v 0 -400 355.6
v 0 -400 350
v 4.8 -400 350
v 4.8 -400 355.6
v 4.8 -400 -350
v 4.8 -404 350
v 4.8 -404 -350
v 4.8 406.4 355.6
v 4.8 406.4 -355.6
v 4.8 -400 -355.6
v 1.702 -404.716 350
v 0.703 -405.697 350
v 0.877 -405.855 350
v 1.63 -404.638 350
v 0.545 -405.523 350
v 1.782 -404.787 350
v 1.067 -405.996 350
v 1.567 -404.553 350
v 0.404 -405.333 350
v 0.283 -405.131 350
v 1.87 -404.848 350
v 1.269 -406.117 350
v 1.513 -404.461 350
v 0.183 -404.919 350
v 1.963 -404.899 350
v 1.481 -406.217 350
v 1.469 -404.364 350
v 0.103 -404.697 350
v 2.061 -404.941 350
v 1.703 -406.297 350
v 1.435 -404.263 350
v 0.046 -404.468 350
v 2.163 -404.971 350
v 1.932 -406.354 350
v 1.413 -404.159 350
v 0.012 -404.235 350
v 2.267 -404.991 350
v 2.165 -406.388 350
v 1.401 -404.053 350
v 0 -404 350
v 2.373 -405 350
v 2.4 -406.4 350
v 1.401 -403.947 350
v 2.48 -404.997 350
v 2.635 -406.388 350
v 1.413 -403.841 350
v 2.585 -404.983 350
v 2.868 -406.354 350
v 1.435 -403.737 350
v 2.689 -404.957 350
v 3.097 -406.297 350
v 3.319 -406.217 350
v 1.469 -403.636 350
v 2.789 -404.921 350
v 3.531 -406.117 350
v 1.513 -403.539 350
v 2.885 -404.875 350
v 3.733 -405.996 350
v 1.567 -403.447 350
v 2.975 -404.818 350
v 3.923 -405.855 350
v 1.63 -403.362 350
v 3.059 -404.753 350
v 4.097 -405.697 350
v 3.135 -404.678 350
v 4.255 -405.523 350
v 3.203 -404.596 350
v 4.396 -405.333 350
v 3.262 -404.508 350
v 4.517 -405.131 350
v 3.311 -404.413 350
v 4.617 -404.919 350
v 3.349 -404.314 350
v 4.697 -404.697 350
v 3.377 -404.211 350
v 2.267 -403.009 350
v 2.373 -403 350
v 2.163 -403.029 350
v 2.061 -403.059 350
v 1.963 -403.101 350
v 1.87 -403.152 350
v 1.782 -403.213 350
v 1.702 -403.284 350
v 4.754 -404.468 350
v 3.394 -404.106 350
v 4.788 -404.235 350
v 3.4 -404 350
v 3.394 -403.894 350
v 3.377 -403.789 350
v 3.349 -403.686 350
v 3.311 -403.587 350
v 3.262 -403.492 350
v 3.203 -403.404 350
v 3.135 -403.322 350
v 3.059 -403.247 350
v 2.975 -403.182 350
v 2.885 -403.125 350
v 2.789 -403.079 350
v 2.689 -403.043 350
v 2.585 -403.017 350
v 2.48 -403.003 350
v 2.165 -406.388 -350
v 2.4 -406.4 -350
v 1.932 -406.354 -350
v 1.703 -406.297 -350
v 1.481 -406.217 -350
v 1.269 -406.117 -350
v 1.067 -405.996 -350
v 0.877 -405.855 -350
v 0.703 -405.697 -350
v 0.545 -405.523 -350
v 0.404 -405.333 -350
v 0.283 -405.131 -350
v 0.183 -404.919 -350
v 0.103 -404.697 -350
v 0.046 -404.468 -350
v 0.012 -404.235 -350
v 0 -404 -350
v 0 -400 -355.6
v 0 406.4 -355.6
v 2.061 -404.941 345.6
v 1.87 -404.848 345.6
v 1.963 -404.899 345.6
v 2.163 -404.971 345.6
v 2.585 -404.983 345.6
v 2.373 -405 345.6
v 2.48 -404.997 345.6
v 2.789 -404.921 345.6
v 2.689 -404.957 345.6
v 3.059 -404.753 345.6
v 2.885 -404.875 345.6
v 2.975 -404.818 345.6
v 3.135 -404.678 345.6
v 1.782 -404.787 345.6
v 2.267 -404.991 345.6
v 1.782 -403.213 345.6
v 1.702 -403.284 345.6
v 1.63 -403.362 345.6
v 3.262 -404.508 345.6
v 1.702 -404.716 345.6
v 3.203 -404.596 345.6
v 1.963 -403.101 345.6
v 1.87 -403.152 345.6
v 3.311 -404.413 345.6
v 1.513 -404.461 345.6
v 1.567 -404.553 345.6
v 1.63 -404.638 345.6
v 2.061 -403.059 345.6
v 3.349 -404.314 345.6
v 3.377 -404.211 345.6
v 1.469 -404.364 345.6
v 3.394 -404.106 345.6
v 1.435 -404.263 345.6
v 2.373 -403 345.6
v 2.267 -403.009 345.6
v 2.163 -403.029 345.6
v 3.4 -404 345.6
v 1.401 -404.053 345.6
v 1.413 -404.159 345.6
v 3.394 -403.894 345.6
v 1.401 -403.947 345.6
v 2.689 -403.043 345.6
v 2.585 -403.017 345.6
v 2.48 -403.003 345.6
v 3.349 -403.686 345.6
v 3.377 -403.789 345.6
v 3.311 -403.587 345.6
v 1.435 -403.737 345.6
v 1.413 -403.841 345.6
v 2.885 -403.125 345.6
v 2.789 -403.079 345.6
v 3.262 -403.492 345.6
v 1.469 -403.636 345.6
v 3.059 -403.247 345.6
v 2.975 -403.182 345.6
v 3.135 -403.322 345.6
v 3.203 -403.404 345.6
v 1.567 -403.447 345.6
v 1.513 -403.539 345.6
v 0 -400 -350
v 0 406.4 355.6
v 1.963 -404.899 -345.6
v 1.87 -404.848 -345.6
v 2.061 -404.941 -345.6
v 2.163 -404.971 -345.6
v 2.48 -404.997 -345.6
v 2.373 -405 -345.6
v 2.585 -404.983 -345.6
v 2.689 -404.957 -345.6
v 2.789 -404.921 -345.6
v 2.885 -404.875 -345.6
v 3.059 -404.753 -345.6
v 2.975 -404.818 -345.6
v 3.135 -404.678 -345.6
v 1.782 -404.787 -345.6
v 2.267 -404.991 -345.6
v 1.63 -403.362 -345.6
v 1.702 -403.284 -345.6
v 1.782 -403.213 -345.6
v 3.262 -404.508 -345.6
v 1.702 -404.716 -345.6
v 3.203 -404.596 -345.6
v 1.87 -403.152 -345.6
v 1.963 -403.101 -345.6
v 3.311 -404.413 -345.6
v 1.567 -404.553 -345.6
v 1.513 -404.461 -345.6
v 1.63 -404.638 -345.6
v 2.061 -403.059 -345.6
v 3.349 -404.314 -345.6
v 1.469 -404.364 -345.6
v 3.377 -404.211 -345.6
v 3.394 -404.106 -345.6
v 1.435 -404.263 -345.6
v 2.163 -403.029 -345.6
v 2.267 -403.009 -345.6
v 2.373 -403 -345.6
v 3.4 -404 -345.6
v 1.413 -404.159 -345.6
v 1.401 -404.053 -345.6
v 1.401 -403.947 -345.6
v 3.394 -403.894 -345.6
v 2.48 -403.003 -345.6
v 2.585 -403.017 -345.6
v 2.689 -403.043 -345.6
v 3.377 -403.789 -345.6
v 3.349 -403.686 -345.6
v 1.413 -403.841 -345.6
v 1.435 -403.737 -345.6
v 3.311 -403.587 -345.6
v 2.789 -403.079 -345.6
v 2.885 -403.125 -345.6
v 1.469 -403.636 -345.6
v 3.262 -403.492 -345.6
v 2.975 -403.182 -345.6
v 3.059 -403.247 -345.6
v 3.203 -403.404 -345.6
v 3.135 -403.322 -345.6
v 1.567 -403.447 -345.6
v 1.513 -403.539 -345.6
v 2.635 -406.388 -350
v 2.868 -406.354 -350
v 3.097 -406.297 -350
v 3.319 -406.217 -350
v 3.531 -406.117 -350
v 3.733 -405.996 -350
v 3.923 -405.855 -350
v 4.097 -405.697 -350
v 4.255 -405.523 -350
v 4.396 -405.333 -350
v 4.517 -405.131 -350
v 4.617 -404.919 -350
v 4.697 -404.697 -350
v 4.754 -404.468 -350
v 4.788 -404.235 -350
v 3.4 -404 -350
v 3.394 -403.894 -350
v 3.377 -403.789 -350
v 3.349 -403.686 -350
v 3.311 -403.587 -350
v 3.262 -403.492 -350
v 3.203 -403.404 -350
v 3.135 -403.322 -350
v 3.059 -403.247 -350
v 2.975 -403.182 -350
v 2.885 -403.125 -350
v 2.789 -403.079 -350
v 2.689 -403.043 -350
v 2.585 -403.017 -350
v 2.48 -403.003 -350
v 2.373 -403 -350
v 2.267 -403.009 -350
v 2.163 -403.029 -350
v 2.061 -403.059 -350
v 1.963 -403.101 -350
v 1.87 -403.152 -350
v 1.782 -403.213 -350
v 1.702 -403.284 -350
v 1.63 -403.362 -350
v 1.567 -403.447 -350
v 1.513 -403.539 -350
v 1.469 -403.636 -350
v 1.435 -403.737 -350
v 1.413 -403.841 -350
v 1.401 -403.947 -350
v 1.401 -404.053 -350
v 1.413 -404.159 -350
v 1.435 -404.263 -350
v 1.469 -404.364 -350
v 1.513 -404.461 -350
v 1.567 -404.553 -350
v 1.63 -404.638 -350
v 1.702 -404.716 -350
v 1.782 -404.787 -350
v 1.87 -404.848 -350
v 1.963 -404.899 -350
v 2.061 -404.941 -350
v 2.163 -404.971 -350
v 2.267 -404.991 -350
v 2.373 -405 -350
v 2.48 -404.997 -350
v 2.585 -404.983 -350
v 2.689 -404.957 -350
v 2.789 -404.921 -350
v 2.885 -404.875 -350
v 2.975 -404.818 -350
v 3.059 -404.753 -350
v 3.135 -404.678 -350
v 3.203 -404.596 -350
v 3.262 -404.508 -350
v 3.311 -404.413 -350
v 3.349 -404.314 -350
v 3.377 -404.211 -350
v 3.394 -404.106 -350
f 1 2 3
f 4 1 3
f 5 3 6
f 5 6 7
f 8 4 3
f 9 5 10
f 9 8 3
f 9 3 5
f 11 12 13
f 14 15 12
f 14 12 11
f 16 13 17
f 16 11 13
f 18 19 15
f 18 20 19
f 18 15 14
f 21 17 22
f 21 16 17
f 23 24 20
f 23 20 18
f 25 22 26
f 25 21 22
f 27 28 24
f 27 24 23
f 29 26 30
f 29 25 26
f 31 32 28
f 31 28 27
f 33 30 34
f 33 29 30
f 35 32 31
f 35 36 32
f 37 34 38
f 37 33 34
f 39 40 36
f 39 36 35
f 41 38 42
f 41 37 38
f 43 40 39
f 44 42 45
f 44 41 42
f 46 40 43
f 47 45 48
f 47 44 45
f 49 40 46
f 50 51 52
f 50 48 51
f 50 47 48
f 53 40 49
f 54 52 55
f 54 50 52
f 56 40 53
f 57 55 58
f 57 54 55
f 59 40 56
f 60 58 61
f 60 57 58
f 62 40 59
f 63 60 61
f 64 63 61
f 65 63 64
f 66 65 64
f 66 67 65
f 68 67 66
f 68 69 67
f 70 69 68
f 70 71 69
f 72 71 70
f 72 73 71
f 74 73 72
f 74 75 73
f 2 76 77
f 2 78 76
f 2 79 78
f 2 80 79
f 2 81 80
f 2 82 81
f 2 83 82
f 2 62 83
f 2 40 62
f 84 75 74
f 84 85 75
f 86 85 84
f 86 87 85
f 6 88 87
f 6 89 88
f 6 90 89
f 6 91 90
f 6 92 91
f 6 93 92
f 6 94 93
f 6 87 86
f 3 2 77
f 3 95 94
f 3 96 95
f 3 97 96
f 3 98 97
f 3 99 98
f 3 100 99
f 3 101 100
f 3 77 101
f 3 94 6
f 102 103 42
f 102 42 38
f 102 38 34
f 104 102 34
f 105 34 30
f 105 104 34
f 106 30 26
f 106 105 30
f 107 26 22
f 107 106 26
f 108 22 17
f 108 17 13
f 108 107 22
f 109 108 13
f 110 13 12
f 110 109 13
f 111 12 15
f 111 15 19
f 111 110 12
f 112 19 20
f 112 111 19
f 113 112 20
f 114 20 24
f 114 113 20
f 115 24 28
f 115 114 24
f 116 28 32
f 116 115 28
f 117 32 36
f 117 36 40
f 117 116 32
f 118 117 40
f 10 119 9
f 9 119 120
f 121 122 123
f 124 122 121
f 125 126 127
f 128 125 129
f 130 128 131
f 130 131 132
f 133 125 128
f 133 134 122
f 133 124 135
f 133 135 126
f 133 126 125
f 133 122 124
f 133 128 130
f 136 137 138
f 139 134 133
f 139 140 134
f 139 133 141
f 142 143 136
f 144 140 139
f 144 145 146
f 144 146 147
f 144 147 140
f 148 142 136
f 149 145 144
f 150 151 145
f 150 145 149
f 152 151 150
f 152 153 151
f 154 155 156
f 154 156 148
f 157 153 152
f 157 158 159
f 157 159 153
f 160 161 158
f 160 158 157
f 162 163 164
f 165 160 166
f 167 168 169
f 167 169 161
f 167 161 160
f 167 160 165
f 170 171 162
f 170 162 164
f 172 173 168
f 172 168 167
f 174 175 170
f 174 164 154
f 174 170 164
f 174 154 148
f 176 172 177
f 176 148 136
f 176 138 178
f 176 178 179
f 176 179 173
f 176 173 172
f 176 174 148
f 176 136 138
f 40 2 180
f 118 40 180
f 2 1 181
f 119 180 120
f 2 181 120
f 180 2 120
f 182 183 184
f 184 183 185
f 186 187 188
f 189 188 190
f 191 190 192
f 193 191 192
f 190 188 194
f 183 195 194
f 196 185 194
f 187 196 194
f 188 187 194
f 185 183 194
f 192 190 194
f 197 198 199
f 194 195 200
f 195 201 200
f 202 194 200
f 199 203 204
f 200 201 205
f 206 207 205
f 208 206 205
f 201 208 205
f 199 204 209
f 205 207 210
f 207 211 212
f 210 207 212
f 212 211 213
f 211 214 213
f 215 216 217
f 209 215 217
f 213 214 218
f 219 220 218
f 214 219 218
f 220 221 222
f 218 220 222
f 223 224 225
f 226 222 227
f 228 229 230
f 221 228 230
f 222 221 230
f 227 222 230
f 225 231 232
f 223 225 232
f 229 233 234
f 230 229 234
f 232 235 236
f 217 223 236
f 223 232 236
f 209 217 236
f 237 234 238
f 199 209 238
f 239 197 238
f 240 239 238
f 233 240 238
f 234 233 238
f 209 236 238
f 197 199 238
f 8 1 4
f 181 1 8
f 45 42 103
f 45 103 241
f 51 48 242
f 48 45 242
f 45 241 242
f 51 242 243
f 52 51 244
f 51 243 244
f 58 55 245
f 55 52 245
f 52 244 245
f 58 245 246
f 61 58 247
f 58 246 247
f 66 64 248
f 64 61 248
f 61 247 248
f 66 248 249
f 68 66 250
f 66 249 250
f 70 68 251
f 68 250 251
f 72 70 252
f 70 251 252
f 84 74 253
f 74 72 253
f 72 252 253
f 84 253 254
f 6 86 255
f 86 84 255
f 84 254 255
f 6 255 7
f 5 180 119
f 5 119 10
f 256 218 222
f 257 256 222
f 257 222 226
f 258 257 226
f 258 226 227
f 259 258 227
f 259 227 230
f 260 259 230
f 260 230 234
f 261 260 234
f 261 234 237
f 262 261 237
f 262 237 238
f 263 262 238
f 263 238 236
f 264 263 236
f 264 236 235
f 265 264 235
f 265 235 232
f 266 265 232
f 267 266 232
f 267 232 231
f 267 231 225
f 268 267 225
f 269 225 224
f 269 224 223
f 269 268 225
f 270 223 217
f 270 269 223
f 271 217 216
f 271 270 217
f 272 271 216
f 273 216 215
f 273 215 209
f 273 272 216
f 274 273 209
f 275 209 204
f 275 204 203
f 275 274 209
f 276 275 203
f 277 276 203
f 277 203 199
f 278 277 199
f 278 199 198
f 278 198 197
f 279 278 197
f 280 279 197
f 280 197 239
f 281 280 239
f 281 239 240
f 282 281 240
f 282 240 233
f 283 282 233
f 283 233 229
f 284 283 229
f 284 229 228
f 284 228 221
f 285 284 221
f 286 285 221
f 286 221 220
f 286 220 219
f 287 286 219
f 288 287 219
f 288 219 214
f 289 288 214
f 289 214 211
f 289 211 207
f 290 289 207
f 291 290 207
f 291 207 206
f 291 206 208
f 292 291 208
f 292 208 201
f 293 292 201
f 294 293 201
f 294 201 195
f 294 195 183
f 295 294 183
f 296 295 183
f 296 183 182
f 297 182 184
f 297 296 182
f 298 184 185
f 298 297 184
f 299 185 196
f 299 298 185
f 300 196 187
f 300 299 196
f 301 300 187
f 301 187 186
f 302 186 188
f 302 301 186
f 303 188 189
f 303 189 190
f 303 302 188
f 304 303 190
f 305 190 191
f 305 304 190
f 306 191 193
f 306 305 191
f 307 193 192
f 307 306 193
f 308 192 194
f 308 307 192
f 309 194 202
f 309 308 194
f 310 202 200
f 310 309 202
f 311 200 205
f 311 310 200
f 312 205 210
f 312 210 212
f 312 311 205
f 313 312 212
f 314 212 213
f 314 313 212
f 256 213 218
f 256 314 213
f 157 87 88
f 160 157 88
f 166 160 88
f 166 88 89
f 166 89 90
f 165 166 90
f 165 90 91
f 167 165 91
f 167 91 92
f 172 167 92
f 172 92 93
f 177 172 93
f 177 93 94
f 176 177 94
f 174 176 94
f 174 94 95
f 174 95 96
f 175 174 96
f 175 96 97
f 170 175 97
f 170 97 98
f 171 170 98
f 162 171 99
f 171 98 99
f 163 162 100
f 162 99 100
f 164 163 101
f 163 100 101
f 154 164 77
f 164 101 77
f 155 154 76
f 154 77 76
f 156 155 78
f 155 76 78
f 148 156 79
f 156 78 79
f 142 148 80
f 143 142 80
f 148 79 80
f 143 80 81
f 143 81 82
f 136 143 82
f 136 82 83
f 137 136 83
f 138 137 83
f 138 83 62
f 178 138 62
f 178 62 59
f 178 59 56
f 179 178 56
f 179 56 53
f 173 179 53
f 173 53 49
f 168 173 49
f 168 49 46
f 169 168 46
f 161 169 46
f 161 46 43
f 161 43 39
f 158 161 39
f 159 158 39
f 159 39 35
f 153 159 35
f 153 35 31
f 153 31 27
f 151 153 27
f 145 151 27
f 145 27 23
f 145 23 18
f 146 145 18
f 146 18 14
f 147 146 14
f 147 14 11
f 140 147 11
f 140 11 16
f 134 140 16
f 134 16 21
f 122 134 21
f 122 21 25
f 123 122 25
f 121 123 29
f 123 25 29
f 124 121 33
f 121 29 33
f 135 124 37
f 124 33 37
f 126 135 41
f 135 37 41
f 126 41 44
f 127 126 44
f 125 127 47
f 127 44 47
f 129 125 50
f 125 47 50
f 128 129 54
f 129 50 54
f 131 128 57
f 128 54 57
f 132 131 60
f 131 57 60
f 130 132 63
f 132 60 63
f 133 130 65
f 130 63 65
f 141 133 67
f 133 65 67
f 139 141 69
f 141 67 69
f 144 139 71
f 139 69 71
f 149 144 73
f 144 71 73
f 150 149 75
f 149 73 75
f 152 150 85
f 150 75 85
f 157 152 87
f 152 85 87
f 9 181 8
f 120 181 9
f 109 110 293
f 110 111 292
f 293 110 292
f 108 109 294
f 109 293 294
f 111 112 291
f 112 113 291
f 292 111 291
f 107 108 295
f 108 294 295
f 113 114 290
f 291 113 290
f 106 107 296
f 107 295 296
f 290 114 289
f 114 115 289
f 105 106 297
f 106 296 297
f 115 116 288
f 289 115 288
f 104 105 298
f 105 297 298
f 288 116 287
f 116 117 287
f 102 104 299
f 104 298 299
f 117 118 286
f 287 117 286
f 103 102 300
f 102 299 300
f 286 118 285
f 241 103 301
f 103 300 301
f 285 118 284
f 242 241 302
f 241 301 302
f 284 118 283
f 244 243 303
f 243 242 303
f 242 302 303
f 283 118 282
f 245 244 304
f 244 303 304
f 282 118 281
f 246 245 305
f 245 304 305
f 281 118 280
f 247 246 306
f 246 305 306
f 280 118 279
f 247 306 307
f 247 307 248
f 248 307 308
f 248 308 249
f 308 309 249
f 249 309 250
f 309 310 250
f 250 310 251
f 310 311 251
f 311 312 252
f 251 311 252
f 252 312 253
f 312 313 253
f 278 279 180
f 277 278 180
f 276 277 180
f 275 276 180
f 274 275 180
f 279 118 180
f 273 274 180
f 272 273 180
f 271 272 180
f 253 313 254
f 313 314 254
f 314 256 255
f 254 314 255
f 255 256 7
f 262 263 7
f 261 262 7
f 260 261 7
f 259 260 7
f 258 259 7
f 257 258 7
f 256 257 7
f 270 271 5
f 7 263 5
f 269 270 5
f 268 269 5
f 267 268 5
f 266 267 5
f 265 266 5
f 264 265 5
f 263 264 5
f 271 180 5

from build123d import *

# Parameters (mm, degrees)
SKETCH1_W              = 711.2
SKETCH1_H              = 812.8
BOSS_EXTRUDE1_DEPTH    = 4.8
FILLET1_R              = 2.4
CUT_EXTRUDE3_START     = -5.6
CUT_EXTRUDE3_OUTLINE_W = 5
CUT_EXTRUDE3_OUTLINE_H = 7
CUT_EXTRUDE3_DEPTH     = 5.6
SKETCH2_R              = 1
CUT_EXTRUDE1_DEPTH     = 10


# Read off the part's stored shape, not the designer's step: Cut-Extrude3
with BuildPart() as part:
    # Sketch1 → Boss-Extrude1 (new body)
    with BuildSketch(Plane(origin=(0, 0, 0), x_dir=(0, 0, -1), z_dir=(1, 0, 0))):
        Rectangle(SKETCH1_W, SKETCH1_H)
    extrude(amount=BOSS_EXTRUDE1_DEPTH)

    # Fillet1
    fillet1_edges = [part.edges().sort_by_distance(p)[0] for p in [
        (4.8, -406.4, 0),
        (0, -406.4, 0),
    ]]
    fillet(fillet1_edges, radius=FILLET1_R - 0.0001)  # a hair under: the kernel refuses the full size

    # Cut-Extrude3 outline → Cut-Extrude3 (cut)
    with BuildSketch(Plane.XY.offset(355.6).offset(CUT_EXTRUDE3_START)):
        with Locations((2.5, -403.5)):
            Rectangle(CUT_EXTRUDE3_OUTLINE_W, CUT_EXTRUDE3_OUTLINE_H)
    cut_extrude3 = extrude(amount=CUT_EXTRUDE3_DEPTH, mode=Mode.SUBTRACT)

    # Sketch2 → Cut-Extrude1 (cut)
    with BuildSketch(Plane.XY.offset(355.6)):
        with Locations((2.4, -404)):
            Circle(SKETCH2_R)
    cut_extrude1 = extrude(amount=-CUT_EXTRUDE1_DEPTH, mode=Mode.SUBTRACT)

    # Mirror1: Cut-Extrude1 across plane
    add(cut_extrude1.mirror(Plane.XY), mode=Mode.SUBTRACT)

    # Mirror4: Cut-Extrude3 across plane
    add(cut_extrude3.mirror(Plane.XY), mode=Mode.SUBTRACT)


solid = part.part
